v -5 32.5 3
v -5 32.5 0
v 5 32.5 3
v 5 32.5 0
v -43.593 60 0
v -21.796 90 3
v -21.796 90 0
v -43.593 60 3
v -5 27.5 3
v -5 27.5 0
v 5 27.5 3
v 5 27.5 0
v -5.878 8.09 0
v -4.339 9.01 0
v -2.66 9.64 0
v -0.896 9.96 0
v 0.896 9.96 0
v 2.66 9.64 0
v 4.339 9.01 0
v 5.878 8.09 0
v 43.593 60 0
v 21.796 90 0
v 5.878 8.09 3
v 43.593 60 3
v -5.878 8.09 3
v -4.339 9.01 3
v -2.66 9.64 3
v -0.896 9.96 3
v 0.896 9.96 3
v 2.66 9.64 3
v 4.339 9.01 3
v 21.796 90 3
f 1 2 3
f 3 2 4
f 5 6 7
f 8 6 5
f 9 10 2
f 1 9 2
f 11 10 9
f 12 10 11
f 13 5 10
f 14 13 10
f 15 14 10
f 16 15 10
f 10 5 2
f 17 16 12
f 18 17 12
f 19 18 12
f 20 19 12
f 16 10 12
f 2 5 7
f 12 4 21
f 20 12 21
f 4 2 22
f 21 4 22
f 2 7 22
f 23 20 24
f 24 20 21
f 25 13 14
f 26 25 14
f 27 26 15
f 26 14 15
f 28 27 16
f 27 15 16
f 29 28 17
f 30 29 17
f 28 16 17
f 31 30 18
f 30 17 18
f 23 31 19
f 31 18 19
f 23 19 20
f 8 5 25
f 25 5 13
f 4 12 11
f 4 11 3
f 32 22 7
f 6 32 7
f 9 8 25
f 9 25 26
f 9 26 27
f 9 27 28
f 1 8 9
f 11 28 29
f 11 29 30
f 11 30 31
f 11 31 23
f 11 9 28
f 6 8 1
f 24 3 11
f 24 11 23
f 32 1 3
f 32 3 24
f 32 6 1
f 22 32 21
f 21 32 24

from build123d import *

# Parameters (mm, degrees)
SKETCH3_W           = 10
SKETCH3_H           = 5
BOSS_EXTRUDE1_DEPTH = 3
BOSS_EXTRUDE2_DEPTH = 3
CUT_EXTRUDE1_DEPTH  = 4
SKETCH6_R           = 10
CUT_EXTRUDE2_DEPTH  = 4


with BuildPart() as part:
    # Sketch3 → Boss-Extrude1 (new body)
    with BuildSketch(Plane.XY):
        Polygon((0, 0), (54.4906896, 75), (-54.4906896, 75), align=None)
        with Locations((0, 30)):
            Rectangle(SKETCH3_W, SKETCH3_H, mode=Mode.SUBTRACT)
    extrude(amount=BOSS_EXTRUDE1_DEPTH)

    # Sketch4 → Boss-Extrude2 (add)
    with BuildSketch(Plane(origin=(0, 0, 0), x_dir=(-1, 0, 0), z_dir=(0, 0, -1))):
        Polygon((-54.4906896, 75), (-65.38882752, 90), (65.38882752, 90), (54.4906896, 75), align=None)
    extrude(amount=-BOSS_EXTRUDE2_DEPTH)

    # Sketch5 → Cut-Extrude1 (cut, through all)
    with BuildSketch(Plane.XY.offset(3)):
        Polygon((-65.38882752, 90), (-21.79627584, 90), (-43.59255168, 60), align=None)
        Polygon((65.38882752, 90), (21.79627584, 90), (43.59255168, 60), align=None)
    extrude(amount=-CUT_EXTRUDE1_DEPTH, mode=Mode.SUBTRACT)

    # Sketch6 → Cut-Extrude2 (cut, through all)
    with BuildSketch(Plane(origin=(0, 0, 0), x_dir=(-1, 0, 0), z_dir=(0, 0, -1))):
        Circle(SKETCH6_R)
    extrude(amount=-CUT_EXTRUDE2_DEPTH, mode=Mode.SUBTRACT)


solid = part.part
